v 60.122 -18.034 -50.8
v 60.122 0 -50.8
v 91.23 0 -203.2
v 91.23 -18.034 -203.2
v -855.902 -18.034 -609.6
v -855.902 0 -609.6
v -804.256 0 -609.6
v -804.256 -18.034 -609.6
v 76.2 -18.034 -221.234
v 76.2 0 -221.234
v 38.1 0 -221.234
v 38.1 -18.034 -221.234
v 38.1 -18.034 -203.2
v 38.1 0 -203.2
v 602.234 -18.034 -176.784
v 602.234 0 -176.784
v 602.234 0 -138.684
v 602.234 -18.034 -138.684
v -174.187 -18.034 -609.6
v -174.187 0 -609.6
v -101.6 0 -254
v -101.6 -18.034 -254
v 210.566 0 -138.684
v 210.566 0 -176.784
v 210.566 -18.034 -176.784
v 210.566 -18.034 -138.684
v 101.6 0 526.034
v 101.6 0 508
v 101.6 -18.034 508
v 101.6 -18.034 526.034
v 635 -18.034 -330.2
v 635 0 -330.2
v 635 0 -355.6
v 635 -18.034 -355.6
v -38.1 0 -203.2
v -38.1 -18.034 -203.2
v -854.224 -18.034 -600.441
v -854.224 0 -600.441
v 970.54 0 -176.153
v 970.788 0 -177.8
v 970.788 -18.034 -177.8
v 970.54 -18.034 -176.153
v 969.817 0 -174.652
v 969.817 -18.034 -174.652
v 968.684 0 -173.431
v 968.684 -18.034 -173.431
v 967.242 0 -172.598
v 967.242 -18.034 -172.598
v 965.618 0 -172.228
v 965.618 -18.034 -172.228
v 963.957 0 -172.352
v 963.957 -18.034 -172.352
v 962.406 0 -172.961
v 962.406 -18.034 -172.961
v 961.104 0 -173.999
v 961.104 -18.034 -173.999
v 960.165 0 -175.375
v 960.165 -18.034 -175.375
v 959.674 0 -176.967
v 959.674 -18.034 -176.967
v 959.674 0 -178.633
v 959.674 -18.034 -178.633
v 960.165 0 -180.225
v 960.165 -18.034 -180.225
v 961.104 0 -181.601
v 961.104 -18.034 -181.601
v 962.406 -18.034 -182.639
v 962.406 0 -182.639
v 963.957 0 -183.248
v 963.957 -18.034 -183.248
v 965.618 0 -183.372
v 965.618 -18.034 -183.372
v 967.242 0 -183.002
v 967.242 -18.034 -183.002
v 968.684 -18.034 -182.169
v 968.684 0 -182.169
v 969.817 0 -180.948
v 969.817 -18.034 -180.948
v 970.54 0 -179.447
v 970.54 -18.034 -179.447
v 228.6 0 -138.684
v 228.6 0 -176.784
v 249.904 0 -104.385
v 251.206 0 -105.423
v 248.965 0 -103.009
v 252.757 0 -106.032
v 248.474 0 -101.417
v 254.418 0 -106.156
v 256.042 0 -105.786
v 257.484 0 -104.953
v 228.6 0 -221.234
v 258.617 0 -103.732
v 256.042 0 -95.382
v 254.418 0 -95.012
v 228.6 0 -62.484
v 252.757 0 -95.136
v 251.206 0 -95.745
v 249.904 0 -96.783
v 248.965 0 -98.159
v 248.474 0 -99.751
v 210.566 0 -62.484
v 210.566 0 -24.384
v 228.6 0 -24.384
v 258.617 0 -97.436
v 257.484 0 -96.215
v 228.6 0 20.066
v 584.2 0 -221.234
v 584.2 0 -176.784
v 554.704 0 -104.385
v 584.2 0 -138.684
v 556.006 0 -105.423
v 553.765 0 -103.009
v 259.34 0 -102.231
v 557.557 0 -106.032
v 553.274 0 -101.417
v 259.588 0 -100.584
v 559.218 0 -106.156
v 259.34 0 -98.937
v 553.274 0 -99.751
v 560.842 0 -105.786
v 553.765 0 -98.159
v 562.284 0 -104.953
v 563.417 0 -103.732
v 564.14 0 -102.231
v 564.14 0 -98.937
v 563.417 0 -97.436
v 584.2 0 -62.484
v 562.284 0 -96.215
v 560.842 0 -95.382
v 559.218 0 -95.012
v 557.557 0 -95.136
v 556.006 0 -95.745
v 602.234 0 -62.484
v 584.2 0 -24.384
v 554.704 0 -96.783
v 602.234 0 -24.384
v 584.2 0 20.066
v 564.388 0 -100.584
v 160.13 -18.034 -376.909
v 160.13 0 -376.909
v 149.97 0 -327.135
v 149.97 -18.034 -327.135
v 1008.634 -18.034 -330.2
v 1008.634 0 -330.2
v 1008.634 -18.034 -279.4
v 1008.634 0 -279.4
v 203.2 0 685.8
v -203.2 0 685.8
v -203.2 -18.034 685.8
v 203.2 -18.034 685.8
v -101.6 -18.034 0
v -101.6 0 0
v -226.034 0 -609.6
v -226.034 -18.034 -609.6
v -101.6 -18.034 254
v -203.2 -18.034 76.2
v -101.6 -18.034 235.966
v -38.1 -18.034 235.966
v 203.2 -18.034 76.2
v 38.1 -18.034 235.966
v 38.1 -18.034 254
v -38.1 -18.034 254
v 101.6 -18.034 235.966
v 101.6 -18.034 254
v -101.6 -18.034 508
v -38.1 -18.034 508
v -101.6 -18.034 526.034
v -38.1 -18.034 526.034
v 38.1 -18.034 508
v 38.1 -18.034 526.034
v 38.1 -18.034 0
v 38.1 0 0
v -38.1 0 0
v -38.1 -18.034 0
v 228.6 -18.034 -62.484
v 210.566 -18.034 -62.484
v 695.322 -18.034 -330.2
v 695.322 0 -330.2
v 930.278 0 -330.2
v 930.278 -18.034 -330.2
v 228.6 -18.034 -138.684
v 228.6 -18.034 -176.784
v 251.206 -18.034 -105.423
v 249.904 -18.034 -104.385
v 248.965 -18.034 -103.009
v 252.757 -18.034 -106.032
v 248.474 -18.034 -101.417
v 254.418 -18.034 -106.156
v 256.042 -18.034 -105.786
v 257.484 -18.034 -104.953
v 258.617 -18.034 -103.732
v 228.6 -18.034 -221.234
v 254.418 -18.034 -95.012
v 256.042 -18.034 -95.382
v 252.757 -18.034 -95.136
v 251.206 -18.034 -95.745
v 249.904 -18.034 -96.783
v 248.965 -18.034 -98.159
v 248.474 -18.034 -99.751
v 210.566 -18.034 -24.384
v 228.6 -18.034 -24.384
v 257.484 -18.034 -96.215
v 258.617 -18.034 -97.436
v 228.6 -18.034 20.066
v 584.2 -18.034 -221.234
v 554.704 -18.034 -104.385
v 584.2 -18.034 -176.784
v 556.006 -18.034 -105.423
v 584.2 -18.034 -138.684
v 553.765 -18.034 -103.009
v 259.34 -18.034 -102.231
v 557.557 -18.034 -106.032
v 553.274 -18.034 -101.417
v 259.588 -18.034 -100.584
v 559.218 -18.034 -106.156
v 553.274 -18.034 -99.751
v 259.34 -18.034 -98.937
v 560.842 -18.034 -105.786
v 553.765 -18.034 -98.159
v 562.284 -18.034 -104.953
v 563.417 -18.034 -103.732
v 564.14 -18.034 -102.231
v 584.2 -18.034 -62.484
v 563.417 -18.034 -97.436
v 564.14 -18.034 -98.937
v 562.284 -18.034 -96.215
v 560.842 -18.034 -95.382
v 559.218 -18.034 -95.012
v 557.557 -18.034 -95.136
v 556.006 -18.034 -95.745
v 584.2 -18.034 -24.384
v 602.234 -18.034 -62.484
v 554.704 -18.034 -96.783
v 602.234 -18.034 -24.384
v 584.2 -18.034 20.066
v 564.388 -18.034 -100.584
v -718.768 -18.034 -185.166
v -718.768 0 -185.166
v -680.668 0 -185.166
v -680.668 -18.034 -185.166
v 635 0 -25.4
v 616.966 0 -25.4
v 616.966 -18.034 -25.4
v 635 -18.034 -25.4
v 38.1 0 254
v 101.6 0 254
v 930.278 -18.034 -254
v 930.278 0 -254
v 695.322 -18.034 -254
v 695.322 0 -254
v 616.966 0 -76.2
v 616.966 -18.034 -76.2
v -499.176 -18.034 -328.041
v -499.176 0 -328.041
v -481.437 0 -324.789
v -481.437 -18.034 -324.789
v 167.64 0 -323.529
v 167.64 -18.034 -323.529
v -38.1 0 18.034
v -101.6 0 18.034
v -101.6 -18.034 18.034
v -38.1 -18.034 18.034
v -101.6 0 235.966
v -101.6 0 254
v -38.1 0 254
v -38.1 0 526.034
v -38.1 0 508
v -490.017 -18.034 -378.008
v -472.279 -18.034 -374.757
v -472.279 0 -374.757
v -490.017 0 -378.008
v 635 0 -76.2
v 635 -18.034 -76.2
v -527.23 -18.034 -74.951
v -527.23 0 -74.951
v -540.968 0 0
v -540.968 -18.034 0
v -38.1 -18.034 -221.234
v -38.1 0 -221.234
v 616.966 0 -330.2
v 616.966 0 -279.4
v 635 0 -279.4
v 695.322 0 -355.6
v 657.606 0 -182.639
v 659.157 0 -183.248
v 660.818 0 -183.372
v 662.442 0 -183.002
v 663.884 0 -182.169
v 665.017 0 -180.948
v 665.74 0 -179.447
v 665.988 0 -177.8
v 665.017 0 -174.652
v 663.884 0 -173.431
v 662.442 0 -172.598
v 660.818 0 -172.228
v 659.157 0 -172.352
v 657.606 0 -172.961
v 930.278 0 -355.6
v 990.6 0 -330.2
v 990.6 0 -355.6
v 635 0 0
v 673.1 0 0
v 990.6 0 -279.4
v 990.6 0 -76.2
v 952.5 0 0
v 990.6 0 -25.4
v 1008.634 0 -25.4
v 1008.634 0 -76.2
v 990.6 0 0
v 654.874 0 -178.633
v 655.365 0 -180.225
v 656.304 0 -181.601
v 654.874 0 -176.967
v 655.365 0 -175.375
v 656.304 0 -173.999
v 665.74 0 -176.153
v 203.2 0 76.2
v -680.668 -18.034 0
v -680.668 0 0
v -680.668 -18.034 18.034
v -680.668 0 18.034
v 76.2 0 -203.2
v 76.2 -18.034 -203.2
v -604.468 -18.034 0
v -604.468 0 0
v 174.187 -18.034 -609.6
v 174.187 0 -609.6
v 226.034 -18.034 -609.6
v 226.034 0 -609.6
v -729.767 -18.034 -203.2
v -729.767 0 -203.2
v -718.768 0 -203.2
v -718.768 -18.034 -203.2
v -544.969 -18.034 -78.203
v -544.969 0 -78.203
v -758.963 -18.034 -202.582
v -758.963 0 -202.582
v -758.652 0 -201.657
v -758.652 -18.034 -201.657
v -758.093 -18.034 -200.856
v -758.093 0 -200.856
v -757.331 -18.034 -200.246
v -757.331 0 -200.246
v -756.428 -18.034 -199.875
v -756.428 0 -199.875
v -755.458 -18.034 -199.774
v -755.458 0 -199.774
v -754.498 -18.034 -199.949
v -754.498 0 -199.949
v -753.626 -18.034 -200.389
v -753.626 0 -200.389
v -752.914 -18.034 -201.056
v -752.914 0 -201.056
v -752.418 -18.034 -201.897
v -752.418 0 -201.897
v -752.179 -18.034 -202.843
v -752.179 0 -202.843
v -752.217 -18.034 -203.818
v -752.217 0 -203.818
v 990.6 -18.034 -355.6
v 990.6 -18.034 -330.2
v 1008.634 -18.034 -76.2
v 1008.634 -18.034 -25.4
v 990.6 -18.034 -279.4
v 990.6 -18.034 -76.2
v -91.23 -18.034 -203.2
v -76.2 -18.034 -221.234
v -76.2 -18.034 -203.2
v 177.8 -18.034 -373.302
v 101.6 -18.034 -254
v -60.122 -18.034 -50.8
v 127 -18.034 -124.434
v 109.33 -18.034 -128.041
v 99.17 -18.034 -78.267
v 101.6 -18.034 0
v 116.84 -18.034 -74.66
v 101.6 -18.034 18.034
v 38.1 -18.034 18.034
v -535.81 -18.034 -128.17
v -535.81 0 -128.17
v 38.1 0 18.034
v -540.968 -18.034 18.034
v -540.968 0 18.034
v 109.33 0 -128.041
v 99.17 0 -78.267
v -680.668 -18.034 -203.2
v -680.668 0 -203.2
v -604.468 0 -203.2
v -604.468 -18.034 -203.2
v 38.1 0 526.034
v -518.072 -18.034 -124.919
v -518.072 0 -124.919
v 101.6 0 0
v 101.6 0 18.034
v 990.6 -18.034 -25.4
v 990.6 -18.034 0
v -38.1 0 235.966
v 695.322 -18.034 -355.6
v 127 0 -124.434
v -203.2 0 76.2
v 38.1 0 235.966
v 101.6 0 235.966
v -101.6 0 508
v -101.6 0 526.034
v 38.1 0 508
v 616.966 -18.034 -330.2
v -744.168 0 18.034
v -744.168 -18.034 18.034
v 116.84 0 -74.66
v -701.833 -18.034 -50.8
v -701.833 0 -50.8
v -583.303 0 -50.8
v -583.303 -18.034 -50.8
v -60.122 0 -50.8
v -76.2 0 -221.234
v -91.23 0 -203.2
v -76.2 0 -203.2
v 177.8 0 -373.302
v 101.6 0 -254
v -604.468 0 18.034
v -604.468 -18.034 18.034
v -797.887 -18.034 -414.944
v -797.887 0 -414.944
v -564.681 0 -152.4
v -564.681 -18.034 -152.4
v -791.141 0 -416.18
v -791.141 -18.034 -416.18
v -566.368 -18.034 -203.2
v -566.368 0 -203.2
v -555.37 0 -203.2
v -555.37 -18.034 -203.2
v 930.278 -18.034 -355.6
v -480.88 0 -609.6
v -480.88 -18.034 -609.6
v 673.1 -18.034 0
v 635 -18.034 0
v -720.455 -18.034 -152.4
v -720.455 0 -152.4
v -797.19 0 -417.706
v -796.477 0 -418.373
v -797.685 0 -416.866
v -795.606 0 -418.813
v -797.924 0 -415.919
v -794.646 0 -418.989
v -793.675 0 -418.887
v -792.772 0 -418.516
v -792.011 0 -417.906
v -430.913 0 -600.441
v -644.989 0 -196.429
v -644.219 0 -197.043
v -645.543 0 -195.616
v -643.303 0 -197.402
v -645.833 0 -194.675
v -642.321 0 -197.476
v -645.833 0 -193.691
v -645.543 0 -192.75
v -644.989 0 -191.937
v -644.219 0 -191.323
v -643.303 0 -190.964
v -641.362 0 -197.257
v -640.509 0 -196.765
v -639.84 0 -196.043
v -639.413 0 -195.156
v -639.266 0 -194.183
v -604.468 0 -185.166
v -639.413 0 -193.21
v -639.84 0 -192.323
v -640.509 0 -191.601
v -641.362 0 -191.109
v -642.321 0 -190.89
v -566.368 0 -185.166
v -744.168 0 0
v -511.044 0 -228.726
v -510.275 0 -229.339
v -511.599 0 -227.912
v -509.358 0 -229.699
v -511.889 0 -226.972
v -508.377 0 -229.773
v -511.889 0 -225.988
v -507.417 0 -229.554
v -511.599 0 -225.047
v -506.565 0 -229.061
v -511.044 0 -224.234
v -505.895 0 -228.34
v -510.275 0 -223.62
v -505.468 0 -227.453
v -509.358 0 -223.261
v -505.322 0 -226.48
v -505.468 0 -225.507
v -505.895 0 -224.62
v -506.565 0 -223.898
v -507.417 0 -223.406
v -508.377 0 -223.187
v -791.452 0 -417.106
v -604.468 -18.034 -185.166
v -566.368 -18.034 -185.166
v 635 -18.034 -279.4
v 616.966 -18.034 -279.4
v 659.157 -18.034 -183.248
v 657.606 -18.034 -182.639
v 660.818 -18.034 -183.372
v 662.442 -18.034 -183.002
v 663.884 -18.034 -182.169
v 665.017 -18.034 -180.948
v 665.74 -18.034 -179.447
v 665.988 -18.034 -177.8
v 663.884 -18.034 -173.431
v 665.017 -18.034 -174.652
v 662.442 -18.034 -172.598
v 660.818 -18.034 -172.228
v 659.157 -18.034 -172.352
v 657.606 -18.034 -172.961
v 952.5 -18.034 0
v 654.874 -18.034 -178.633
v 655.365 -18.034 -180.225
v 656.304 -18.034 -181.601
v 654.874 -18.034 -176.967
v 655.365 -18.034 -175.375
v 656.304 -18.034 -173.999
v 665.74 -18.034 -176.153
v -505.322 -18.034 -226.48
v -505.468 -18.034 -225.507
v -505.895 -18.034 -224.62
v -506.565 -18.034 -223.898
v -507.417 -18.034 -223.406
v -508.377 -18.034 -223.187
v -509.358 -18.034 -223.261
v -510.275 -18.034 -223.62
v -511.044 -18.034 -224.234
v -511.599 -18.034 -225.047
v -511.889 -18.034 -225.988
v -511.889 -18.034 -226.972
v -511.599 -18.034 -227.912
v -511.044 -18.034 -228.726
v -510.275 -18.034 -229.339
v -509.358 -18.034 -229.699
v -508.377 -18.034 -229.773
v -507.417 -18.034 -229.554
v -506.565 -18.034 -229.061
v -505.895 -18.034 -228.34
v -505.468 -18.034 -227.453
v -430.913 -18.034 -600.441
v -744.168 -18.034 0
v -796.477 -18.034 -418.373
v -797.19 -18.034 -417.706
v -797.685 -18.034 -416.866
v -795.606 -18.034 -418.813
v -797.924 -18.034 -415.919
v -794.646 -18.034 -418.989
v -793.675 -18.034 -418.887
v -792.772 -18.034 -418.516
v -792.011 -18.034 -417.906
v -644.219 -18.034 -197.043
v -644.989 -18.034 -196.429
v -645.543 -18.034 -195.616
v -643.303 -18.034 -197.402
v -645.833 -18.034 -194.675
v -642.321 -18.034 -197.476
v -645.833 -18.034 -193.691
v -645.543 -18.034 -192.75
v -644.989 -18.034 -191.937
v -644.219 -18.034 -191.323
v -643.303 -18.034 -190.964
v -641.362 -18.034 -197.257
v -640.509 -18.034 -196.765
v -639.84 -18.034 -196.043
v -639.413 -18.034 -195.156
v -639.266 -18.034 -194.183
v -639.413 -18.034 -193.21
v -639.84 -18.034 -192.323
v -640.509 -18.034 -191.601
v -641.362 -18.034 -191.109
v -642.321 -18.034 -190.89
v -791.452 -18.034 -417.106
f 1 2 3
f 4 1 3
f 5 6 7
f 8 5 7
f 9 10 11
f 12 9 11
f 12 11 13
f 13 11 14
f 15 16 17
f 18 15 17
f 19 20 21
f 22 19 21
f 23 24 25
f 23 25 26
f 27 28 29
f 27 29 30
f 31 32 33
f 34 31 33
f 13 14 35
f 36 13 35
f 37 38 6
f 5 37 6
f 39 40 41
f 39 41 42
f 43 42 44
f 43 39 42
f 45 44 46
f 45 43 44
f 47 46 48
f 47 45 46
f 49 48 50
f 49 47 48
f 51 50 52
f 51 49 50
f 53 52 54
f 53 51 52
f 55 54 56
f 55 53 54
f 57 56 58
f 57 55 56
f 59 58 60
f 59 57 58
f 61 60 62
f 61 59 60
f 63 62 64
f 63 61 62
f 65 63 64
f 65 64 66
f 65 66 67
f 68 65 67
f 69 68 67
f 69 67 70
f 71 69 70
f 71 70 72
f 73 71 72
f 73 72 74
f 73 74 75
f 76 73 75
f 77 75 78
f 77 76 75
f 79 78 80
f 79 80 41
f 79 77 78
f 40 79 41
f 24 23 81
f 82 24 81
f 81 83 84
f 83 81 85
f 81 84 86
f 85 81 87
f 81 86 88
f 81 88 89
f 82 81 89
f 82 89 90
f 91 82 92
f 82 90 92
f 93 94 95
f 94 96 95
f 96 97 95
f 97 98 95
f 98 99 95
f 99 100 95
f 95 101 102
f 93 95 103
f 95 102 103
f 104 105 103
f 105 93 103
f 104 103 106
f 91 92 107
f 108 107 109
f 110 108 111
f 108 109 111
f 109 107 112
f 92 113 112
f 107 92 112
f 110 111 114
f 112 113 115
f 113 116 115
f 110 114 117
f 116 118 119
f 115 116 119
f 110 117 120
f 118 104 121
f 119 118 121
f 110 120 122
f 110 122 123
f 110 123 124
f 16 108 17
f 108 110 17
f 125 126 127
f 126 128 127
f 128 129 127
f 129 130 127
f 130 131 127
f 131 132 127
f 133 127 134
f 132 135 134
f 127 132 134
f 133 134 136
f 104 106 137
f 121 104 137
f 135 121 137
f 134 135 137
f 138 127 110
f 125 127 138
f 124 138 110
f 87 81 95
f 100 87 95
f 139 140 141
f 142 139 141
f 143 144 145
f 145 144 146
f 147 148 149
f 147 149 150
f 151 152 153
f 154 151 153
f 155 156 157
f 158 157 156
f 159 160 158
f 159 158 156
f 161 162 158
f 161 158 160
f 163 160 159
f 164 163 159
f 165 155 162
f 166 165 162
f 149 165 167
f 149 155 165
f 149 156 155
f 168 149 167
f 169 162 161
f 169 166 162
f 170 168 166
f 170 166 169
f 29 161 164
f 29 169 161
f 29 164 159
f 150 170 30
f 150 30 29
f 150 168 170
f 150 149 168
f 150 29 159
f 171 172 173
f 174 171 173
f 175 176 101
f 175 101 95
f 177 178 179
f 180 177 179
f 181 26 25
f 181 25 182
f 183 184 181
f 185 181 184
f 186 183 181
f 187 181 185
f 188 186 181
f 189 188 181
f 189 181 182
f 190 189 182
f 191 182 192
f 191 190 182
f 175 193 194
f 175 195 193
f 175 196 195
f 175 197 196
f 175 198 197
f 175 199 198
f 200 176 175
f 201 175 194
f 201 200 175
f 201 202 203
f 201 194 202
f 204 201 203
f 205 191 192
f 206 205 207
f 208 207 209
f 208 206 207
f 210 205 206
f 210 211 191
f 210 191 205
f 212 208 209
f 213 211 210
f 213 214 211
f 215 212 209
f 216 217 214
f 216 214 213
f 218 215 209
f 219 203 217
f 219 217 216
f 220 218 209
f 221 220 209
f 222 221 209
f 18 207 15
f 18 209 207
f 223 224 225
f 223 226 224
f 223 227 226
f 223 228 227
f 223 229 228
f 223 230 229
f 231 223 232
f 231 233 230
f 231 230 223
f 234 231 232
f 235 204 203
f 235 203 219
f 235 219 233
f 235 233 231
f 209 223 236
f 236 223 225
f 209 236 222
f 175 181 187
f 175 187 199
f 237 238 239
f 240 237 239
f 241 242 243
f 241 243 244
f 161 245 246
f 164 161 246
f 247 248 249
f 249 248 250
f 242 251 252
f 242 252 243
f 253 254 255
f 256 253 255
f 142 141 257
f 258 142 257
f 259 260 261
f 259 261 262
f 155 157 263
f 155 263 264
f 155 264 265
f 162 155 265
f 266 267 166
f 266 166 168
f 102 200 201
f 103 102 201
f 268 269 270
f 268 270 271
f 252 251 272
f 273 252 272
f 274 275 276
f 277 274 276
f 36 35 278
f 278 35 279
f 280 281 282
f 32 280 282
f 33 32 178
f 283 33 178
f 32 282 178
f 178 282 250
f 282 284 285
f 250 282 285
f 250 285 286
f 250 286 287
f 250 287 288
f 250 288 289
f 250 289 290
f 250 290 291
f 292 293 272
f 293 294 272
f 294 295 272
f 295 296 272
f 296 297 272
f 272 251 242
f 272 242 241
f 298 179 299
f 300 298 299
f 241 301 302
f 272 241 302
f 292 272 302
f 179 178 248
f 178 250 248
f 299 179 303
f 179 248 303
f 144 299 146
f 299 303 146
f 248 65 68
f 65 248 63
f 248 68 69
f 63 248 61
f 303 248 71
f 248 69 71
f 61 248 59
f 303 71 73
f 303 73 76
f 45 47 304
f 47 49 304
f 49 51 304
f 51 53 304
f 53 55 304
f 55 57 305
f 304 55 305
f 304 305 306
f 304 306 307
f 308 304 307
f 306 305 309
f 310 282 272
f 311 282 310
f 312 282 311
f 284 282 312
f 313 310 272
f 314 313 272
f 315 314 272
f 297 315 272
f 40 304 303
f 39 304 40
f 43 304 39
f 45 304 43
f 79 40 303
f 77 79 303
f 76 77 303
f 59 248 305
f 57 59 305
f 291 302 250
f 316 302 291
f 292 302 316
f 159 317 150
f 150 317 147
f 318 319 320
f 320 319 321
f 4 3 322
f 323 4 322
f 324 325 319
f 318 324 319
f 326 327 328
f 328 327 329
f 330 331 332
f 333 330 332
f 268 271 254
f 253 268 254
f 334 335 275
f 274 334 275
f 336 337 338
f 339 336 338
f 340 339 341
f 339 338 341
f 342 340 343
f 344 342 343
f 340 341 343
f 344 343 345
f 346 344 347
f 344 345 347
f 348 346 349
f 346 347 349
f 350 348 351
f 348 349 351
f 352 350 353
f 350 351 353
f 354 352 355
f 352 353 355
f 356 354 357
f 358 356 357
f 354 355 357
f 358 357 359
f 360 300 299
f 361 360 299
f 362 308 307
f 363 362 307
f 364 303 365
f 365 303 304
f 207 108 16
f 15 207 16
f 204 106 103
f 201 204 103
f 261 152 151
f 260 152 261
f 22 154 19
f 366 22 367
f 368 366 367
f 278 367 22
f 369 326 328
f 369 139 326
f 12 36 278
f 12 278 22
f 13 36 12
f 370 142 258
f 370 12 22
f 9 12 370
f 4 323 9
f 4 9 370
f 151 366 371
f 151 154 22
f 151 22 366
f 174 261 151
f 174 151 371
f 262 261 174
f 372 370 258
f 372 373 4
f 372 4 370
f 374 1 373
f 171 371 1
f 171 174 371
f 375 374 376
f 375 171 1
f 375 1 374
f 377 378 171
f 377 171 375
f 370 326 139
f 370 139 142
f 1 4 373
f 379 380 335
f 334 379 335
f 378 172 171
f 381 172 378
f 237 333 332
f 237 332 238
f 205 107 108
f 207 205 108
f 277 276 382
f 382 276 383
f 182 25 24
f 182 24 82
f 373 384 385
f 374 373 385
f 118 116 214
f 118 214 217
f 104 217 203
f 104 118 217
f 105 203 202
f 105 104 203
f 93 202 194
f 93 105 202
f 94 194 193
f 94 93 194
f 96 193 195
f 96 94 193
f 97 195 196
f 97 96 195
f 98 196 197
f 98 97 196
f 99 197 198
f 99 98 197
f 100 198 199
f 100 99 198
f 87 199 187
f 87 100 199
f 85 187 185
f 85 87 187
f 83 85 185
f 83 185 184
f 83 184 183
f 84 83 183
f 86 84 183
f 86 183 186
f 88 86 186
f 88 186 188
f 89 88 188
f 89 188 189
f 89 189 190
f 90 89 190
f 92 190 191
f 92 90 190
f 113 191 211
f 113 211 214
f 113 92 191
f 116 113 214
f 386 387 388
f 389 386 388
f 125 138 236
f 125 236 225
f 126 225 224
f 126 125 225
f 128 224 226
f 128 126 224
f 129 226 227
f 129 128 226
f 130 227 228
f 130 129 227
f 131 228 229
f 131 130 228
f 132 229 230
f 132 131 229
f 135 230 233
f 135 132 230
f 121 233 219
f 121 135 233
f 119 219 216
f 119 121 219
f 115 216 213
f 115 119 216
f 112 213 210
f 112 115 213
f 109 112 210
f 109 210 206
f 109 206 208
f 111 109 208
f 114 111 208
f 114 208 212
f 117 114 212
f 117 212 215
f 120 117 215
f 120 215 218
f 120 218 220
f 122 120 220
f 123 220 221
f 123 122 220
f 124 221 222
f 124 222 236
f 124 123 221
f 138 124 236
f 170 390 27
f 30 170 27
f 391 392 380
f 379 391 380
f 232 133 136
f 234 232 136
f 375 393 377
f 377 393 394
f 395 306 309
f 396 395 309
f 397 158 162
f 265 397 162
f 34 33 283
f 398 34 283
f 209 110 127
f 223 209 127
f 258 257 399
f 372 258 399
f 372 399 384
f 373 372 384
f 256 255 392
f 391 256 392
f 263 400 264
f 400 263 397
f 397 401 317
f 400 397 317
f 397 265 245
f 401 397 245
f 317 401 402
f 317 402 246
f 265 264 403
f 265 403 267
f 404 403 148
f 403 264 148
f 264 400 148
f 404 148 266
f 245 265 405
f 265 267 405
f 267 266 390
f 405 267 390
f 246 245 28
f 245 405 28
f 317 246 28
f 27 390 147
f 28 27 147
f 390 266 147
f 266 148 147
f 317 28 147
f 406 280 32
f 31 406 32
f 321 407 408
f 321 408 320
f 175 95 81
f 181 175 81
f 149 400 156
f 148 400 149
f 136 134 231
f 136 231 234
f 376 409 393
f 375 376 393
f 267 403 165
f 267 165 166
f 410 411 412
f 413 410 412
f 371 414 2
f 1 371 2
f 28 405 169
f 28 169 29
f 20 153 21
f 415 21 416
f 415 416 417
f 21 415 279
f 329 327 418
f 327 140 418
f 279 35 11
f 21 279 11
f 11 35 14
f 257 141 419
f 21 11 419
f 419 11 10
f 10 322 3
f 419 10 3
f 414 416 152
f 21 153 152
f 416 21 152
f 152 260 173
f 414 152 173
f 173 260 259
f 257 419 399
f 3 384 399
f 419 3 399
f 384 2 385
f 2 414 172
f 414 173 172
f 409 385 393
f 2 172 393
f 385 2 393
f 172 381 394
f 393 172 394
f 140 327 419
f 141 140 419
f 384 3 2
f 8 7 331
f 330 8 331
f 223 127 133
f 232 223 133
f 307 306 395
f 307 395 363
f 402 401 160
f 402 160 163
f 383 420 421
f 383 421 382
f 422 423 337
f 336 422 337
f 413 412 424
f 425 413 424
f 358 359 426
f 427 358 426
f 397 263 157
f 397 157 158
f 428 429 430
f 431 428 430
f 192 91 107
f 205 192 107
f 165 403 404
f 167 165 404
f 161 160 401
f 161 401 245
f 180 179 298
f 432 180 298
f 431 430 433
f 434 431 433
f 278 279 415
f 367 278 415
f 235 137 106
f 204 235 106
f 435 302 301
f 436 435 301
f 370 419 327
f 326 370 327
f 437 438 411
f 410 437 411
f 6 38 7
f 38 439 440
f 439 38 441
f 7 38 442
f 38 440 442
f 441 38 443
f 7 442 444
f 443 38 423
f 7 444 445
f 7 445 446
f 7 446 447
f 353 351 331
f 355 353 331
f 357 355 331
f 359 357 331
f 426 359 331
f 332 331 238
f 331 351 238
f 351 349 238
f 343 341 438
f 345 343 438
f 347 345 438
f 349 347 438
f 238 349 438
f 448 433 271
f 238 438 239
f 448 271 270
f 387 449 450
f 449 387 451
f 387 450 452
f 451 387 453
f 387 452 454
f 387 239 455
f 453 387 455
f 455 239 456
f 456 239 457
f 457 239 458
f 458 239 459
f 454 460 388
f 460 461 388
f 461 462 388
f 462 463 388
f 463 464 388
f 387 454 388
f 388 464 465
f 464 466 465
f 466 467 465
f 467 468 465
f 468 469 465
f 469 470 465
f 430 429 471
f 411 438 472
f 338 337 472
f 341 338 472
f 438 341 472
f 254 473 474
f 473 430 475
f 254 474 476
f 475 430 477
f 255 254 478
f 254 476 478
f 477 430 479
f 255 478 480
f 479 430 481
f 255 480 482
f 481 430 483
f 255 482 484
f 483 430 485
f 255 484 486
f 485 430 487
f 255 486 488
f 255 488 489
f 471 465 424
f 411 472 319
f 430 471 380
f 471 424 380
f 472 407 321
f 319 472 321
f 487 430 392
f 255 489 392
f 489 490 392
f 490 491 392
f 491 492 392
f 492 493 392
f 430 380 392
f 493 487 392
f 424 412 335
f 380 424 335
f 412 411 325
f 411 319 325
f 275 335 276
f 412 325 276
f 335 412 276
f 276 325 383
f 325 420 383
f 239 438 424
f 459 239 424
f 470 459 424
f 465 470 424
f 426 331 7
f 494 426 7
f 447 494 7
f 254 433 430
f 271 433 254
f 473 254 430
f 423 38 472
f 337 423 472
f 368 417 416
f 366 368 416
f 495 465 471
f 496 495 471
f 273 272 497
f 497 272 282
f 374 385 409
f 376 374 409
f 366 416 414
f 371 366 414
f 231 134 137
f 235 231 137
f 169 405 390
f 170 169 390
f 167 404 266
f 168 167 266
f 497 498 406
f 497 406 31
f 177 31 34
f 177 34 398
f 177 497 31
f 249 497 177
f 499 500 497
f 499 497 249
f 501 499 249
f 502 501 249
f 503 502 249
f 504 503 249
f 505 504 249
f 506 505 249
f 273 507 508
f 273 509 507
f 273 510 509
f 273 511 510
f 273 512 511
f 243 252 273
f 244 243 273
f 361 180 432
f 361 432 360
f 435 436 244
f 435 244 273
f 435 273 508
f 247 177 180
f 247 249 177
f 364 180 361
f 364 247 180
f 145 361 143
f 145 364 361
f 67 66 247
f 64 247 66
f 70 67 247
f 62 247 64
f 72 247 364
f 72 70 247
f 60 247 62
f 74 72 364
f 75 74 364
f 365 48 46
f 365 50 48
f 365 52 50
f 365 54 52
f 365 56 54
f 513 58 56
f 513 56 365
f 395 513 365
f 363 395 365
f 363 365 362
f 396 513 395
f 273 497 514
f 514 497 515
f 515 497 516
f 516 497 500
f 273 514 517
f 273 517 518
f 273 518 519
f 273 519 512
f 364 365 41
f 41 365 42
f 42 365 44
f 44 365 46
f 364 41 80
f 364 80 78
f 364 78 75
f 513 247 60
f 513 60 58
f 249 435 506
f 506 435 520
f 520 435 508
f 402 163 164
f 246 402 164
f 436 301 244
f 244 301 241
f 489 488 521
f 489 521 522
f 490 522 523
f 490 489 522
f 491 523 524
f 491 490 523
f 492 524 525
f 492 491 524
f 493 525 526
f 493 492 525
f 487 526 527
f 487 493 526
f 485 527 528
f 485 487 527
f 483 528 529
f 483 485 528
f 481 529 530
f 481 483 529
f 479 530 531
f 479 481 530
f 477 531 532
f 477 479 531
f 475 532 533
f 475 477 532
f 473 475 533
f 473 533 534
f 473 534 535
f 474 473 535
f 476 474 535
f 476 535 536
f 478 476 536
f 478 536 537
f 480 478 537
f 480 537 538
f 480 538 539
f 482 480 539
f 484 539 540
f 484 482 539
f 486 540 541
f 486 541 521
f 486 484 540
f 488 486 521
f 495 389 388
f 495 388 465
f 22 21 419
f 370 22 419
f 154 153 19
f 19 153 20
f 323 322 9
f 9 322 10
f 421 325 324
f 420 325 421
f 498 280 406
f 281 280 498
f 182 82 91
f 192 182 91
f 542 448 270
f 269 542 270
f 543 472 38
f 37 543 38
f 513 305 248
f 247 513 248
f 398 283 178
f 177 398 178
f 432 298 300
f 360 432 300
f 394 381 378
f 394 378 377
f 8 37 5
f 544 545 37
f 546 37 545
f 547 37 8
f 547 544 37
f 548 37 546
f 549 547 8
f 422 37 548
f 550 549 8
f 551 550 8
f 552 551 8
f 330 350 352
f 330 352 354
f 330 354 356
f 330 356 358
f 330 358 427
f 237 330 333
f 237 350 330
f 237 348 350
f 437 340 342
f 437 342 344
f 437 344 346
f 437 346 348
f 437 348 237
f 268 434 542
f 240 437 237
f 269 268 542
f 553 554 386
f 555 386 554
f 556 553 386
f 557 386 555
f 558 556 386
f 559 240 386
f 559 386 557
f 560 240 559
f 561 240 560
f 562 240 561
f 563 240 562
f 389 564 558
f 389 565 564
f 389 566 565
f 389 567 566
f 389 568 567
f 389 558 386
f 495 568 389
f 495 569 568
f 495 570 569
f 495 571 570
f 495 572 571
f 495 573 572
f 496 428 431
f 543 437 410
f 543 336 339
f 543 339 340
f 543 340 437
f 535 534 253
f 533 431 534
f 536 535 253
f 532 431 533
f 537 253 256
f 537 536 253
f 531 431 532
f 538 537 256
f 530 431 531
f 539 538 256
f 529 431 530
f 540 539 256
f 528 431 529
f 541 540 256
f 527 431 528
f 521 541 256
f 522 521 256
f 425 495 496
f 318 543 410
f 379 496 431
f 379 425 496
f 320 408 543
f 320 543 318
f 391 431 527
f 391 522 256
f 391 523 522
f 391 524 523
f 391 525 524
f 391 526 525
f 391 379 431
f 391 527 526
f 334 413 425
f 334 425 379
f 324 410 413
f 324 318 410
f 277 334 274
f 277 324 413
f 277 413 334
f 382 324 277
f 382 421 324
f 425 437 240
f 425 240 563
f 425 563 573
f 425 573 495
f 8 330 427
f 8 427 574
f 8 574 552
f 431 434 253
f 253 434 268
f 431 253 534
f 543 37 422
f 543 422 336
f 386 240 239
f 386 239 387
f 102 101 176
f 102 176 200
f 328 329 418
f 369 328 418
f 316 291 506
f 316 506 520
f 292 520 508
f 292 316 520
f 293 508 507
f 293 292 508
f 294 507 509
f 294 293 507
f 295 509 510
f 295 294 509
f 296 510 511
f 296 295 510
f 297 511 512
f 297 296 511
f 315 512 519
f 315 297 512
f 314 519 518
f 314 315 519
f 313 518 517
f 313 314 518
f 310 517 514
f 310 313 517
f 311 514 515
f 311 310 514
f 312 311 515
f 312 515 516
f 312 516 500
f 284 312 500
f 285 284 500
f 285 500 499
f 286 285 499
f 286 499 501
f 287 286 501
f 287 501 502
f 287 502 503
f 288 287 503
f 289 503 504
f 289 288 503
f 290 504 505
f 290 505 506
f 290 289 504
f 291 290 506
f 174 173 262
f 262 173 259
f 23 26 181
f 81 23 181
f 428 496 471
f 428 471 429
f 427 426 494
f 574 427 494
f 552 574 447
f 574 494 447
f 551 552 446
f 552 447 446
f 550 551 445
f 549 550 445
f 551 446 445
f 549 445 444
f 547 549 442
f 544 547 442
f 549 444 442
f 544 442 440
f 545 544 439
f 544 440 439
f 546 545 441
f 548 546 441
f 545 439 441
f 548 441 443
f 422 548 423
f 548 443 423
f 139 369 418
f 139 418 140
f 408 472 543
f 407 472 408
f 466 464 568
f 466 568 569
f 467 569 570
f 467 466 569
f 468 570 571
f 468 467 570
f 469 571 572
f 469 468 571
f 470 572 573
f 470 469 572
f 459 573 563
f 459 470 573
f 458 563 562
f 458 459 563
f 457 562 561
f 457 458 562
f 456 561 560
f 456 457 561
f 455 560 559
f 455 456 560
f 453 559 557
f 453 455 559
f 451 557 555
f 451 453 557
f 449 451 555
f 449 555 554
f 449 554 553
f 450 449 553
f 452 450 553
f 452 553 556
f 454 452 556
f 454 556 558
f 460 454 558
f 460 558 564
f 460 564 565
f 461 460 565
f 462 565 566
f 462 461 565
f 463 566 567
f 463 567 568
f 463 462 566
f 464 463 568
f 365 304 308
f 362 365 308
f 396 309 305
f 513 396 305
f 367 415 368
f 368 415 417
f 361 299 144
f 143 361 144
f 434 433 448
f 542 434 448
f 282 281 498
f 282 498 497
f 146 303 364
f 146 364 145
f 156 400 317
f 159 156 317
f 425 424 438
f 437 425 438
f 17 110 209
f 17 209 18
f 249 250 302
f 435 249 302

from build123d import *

# Parameters (mm, degrees)
F0_W     = 406.4
F0_H     = 609.6
F0_W_2   = 63.5
F0_H_2   = 18.034
F0_R     = 5.588
F0_W_3   = 18.034
F0_H_3   = 38.1
F0_H_4   = 50.8
F0_R_2   = 3.302
F1_DEPTH = 18.034


with BuildPart() as f1:
    # F0 (on Front) → F1 (new body)
    with BuildSketch(Plane.XZ):
        with Locations((0, 381)):
            Rectangle(F0_W, F0_H)
        with Locations((-69.85, 244.983)):
            Rectangle(F0_W_2, F0_H_2, mode=Mode.SUBTRACT)
        with Locations((69.85, 244.983)):
            Rectangle(F0_W_2, F0_H_2, mode=Mode.SUBTRACT)
        with Locations((-69.85, 517.017)):
            Rectangle(F0_W_2, F0_H_2, mode=Mode.SUBTRACT)
        with Locations((69.85, 517.017)):
            Rectangle(F0_W_2, F0_H_2, mode=Mode.SUBTRACT)
        Polygon((-38.1, 0), (-101.6, 0), (-226.034079, -609.6), (-174.186546, -609.6), (-101.6, -254), (101.6, -254), (174.186546, -609.6), (226.034079, -609.6), (177.8, -373.302237), (160.130361, -376.909037), (149.970361, -327.135405), (167.64, -323.528605), (127, -124.434079), (109.330361, -128.040879), (99.170361, -78.267247), (116.84, -74.660447), (101.6, 0), (38.1, 0), align=None)
        Polygon((-91.230493, -203.2), (-60.121974, -50.8), (60.121974, -50.8), (91.230493, -203.2), (76.2, -203.2), (76.2, -221.234), (38.1, -221.234), (38.1, -203.2), (-38.1, -203.2), (-38.1, -221.234), (-76.2, -221.234), (-76.2, -203.2), align=None, mode=Mode.SUBTRACT)
        with Locations((69.85, 9.017)):
            Rectangle(F0_W_2, F0_H_2)
        with Locations((-69.85, 9.017)):
            Rectangle(F0_W_2, F0_H_2)
        Polygon((228.6, -176.784), (228.6, -221.234), (584.2, -221.234), (584.2, -176.784), (584.2, -138.684), (584.2, -62.484), (584.2, -24.384), (584.2, 20.066), (228.6, 20.066), (228.6, -24.384), (228.6, -62.484), (228.6, -138.684), align=None)
        with Locations((254, -100.584)):
            Circle(F0_R, mode=Mode.SUBTRACT)
        with Locations((558.8, -100.584)):
            Circle(F0_R, mode=Mode.SUBTRACT)
        with Locations((219.583, -43.434)):
            Rectangle(F0_W_3, F0_H_3)
        with Locations((219.583, -157.734)):
            Rectangle(F0_W_3, F0_H_3)
        with Locations((593.217, -157.734)):
            Rectangle(F0_W_3, F0_H_3)
        with Locations((593.217, -43.434)):
            Rectangle(F0_W_3, F0_H_3)
        Polygon((673.1, 0), (635, 0), (635, -25.4), (635, -76.2), (635, -279.4), (635, -330.2), (635, -355.6), (695.322121, -355.6), (695.322121, -330.2), (812.8, -330.2), (930.277879, -330.2), (930.277879, -355.6), (990.6, -355.6), (990.6, -330.2), (990.6, -279.4), (990.6, -76.2), (990.6, -25.4), (990.6, 0), (952.5, 0), (930.277879, -254), (812.8, -254), (695.322121, -254), align=None)
        with Locations((660.4, -177.8)):
            Circle(F0_R, mode=Mode.SUBTRACT)
        with Locations((965.2, -177.8)):
            Circle(F0_R, mode=Mode.SUBTRACT)
        with Locations((999.617, -50.8)):
            Rectangle(F0_W_3, F0_H_4)
        with Locations((625.983, -50.8)):
            Rectangle(F0_W_3, F0_H_4)
        with Locations((625.983, -304.8)):
            Rectangle(F0_W_3, F0_H_4)
        with Locations((999.617, -304.8)):
            Rectangle(F0_W_3, F0_H_4)
        Polygon((-804.25596, -609.6), (-854.22355, -600.4414), (-855.902238, -609.6), align=None)
        with Locations((-572.718158, 9.017)):
            Rectangle(F0_W_2, F0_H_2)
        with Locations((-712.418158, 9.017)):
            Rectangle(F0_W_2, F0_H_2)
        Polygon((-680.668158, 0), (-744.168158, 0), (-854.22355, -600.4414), (-804.25596, -609.6), (-729.766574, -203.2), (-718.768158, -203.2), (-718.768158, -185.166), (-680.668158, -185.166), (-680.668158, -203.2), (-604.468158, -203.2), (-604.468158, -185.166), (-566.368158, -185.166), (-566.368158, -203.2), (-555.369742, -203.2), (-480.880356, -609.6), (-430.912766, -600.4414), (-472.278657, -374.756924), (-490.017151, -378.008228), (-499.175752, -328.040638), (-481.437257, -324.789335), (-518.071658, -124.918975), (-535.810152, -128.170278), (-544.968752, -78.202688), (-527.230258, -74.951385), (-540.968158, 0), (-604.468158, 0), align=None)
        with BuildLine():
            Line((-797.886576, -414.944052), (-758.962525, -202.581794))
            ThreePointArc((-758.962525, -202.581794), (-754.971507, -199.827188), (-752.2169, -203.818206))
            Line((-752.2169, -203.818206), (-791.140951, -416.180463))
            ThreePointArc((-791.140951, -416.180463), (-795.131969, -418.93507), (-797.886576, -414.944052))
        make_face(mode=Mode.SUBTRACT)
        with Locations((-642.568158, -194.183)):
            Circle(F0_R_2, mode=Mode.SUBTRACT)
        with Locations((-508.623705, -226.479806)):
            Circle(F0_R_2, mode=Mode.SUBTRACT)
        Polygon((-720.455401, -152.4), (-701.833054, -50.8), (-583.303262, -50.8), (-564.680916, -152.4), align=None, mode=Mode.SUBTRACT)
    extrude(amount=F1_DEPTH)


solid = f1.part
